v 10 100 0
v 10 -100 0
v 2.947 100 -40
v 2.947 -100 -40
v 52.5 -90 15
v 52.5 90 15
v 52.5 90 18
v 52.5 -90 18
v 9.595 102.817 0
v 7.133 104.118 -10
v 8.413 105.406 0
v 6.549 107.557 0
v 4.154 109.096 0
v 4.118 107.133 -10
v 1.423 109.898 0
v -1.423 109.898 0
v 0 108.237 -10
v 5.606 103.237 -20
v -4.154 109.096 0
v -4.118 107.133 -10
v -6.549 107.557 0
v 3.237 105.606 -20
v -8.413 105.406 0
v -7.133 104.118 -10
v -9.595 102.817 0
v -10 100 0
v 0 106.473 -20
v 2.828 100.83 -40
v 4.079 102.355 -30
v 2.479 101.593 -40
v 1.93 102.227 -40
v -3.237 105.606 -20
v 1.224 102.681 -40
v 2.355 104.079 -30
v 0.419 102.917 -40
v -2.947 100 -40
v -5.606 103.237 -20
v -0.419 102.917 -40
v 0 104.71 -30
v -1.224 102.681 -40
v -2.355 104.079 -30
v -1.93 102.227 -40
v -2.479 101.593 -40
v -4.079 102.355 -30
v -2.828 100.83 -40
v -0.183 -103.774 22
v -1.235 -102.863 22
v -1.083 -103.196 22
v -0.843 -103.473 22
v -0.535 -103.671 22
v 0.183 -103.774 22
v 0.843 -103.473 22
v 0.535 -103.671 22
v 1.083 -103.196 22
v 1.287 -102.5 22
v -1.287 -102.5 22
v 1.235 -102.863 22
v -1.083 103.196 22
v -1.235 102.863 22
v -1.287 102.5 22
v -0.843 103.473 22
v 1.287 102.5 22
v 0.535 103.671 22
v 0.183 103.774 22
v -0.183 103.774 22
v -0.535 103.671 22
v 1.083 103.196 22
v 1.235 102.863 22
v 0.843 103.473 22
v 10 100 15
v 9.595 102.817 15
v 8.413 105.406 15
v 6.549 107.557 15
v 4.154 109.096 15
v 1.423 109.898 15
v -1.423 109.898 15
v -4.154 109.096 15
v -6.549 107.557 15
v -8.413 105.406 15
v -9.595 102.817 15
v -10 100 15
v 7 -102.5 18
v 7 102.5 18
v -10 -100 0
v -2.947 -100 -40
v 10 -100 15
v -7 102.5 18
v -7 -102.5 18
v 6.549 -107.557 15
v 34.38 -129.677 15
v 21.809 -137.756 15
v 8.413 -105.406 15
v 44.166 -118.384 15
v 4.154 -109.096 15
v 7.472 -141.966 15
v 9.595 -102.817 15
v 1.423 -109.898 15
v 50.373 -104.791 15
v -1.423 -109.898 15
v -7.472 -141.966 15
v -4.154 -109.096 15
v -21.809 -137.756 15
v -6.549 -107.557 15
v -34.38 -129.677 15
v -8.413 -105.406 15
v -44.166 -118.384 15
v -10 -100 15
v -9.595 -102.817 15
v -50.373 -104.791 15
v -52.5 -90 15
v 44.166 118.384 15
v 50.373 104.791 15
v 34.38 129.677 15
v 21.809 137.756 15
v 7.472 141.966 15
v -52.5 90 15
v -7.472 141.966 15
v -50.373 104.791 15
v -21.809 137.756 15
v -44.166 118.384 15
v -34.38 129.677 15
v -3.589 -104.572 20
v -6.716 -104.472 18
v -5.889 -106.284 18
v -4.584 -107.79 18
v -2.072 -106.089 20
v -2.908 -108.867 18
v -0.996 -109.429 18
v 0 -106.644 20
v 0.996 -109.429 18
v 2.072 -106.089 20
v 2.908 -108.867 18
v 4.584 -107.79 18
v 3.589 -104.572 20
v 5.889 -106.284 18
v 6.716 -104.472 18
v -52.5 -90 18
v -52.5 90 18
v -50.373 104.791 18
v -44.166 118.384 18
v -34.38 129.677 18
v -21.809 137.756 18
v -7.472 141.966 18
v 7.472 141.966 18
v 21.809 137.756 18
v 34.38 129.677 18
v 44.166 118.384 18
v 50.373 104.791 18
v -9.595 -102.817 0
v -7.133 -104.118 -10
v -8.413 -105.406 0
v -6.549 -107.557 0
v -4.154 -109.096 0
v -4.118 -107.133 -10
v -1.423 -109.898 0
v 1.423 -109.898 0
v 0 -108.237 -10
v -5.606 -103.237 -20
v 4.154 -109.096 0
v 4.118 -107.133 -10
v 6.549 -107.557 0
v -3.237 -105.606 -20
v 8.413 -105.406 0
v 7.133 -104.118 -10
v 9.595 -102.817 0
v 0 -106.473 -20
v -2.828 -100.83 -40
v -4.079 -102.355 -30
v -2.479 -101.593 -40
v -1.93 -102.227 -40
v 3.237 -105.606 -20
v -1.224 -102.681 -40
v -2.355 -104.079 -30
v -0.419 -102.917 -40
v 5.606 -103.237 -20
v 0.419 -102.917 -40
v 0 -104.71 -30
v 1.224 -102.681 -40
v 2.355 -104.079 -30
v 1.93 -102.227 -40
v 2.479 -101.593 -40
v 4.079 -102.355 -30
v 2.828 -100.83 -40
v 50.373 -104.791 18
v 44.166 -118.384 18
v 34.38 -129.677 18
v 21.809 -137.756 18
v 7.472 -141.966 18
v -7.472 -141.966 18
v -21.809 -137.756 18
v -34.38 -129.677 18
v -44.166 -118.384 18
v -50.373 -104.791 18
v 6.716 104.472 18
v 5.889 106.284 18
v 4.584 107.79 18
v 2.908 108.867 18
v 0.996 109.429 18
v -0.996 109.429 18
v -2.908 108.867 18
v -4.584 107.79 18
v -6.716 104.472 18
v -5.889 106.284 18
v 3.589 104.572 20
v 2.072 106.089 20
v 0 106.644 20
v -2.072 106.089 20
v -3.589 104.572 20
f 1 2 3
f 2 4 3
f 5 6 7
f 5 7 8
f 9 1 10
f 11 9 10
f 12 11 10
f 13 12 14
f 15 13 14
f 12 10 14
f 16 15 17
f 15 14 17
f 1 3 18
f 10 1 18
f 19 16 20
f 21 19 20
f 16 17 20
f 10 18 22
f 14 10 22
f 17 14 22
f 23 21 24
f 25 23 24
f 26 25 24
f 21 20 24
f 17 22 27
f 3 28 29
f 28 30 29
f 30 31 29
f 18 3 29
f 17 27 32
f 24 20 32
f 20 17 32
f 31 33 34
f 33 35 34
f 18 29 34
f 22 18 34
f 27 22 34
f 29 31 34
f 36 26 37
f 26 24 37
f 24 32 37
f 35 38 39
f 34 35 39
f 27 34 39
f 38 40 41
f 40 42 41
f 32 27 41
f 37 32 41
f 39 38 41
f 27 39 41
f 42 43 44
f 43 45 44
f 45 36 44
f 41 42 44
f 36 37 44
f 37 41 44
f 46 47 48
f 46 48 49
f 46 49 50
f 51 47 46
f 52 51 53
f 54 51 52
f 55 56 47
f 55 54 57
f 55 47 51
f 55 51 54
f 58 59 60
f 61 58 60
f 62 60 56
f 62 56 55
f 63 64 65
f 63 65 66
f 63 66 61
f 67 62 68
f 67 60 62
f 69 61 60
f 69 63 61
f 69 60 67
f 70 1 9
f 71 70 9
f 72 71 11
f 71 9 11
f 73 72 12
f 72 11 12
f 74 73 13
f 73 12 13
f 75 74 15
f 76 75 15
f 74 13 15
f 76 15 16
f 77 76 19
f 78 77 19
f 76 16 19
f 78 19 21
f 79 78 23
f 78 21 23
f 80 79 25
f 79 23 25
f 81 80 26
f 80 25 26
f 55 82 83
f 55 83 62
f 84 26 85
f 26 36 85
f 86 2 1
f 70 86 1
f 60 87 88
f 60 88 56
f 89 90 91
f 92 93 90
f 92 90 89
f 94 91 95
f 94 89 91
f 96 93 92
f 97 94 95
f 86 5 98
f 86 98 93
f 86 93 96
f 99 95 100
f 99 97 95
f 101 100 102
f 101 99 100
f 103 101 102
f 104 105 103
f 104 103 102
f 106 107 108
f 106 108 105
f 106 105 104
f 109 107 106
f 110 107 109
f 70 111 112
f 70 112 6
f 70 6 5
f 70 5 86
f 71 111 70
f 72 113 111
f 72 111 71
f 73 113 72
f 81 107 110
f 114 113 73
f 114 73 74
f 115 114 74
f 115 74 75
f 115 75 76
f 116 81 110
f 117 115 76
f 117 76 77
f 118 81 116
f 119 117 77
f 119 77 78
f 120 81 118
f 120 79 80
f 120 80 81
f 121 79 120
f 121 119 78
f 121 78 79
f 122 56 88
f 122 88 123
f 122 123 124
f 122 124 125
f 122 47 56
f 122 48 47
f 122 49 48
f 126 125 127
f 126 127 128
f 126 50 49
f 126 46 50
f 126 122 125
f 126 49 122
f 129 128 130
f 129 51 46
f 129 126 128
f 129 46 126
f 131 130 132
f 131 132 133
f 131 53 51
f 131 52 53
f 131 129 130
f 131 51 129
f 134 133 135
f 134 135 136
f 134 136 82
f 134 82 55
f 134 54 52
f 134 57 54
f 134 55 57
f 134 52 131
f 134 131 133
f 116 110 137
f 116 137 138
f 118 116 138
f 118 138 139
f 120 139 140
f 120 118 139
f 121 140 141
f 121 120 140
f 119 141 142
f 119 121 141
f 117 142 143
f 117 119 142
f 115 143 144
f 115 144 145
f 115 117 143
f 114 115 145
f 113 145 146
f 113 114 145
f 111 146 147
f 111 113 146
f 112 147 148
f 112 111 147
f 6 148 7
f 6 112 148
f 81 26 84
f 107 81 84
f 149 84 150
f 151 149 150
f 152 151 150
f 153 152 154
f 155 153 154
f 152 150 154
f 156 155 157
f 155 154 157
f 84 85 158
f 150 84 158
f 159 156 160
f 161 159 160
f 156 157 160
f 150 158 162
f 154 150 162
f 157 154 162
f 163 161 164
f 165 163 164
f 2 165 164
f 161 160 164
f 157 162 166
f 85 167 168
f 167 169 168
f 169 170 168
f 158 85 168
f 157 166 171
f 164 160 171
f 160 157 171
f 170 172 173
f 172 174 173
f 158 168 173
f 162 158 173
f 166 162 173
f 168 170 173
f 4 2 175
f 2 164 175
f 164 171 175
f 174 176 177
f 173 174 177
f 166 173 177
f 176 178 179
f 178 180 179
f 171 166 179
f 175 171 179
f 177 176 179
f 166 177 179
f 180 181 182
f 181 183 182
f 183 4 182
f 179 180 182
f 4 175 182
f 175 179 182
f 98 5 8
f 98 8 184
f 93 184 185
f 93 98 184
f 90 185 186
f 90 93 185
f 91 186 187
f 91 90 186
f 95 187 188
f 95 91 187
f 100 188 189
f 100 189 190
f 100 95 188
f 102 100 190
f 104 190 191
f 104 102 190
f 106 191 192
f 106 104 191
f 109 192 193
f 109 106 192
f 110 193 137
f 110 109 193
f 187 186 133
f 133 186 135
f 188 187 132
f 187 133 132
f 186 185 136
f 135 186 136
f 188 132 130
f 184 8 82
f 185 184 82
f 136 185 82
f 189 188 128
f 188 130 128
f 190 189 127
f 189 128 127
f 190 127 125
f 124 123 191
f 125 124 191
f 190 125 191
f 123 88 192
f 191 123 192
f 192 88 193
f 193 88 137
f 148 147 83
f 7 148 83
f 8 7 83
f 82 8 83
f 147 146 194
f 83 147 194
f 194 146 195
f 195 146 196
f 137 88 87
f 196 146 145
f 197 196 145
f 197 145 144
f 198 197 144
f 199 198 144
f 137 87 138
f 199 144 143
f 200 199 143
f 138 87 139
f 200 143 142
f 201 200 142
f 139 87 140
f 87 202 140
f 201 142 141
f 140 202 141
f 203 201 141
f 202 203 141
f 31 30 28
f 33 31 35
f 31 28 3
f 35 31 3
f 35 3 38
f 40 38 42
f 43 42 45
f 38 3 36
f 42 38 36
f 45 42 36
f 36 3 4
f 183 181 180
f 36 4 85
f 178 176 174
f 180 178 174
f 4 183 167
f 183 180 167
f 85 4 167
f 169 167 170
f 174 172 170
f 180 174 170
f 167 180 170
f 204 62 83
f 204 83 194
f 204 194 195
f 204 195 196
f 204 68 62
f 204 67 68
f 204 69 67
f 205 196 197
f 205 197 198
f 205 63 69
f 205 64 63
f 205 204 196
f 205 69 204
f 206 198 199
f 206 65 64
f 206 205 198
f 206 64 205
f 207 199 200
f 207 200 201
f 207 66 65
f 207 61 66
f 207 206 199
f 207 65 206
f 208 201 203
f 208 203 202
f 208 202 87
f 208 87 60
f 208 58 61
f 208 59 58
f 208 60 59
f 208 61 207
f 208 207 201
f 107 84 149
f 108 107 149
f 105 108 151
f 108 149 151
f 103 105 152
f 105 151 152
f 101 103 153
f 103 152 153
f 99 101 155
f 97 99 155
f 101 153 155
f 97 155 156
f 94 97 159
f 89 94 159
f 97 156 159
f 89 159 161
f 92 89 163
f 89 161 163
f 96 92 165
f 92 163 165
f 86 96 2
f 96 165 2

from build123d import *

# Parameters (mm, degrees)
BOSS_EXTRUDE1_DEPTH           = 15
BOSS_EXTRUDE1_OTHER_WAY_DEPTH = 40
BOSS_EXTRUDE1_OTHER_WAY_TAPER = 10
BOSS_EXTRUDE2_DEPTH           = 3
BOSS_EXTRUDE3_DEPTH           = 4
BOSS_EXTRUDE3_TAPER           = 55


with BuildPart() as part:
    # Sketch1 → Boss-Extrude1 (new body)
    with BuildSketch(Plane.XY):
        with BuildLine():
            ThreePointArc((-10, -100), (0, -110), (10, -100))
            Line((10, -100), (10, 100))
            ThreePointArc((10, 100), (0, 110), (-10, 100))
            Line((-10, 100), (-10, -100))
        make_face()
    extrude(amount=BOSS_EXTRUDE1_DEPTH)

    # Sketch1 → Boss-Extrude1 other way (add)
    with BuildSketch(Plane.XY):
        with BuildLine():
            ThreePointArc((-10, -100), (0, -110), (10, -100))
            Line((10, -100), (10, 100))
            ThreePointArc((10, 100), (0, 110), (-10, 100))
            Line((-10, 100), (-10, -100))
        make_face()
    extrude(amount=-BOSS_EXTRUDE1_OTHER_WAY_DEPTH, taper=BOSS_EXTRUDE1_OTHER_WAY_TAPER)

    # Sketch2 → Boss-Extrude2 (add)
    with BuildSketch(Plane.XY.offset(15)):
        with BuildLine():
            Line((-52.5, -90), (-52.5, 90))
            ThreePointArc((-52.5, 90), (0, 142.5), (52.5, 90))
            Line((52.5, 90), (52.5, -90))
            ThreePointArc((52.5, -90), (0, -142.5), (-52.5, -90))
        make_face()
    extrude(amount=BOSS_EXTRUDE2_DEPTH)

    # Sketch3 → Boss-Extrude3 (add)
    with BuildSketch(Plane.XY.offset(18)):
        with BuildLine():
            ThreePointArc((-7, -102.5), (0, -109.5), (7, -102.5))
            Line((7, -102.5), (7, 102.5))
            ThreePointArc((7, 102.5), (0, 109.5), (-7, 102.5))
            Line((-7, 102.5), (-7, -102.5))
        make_face()
    extrude(amount=BOSS_EXTRUDE3_DEPTH, taper=BOSS_EXTRUDE3_TAPER)


solid = part.part
